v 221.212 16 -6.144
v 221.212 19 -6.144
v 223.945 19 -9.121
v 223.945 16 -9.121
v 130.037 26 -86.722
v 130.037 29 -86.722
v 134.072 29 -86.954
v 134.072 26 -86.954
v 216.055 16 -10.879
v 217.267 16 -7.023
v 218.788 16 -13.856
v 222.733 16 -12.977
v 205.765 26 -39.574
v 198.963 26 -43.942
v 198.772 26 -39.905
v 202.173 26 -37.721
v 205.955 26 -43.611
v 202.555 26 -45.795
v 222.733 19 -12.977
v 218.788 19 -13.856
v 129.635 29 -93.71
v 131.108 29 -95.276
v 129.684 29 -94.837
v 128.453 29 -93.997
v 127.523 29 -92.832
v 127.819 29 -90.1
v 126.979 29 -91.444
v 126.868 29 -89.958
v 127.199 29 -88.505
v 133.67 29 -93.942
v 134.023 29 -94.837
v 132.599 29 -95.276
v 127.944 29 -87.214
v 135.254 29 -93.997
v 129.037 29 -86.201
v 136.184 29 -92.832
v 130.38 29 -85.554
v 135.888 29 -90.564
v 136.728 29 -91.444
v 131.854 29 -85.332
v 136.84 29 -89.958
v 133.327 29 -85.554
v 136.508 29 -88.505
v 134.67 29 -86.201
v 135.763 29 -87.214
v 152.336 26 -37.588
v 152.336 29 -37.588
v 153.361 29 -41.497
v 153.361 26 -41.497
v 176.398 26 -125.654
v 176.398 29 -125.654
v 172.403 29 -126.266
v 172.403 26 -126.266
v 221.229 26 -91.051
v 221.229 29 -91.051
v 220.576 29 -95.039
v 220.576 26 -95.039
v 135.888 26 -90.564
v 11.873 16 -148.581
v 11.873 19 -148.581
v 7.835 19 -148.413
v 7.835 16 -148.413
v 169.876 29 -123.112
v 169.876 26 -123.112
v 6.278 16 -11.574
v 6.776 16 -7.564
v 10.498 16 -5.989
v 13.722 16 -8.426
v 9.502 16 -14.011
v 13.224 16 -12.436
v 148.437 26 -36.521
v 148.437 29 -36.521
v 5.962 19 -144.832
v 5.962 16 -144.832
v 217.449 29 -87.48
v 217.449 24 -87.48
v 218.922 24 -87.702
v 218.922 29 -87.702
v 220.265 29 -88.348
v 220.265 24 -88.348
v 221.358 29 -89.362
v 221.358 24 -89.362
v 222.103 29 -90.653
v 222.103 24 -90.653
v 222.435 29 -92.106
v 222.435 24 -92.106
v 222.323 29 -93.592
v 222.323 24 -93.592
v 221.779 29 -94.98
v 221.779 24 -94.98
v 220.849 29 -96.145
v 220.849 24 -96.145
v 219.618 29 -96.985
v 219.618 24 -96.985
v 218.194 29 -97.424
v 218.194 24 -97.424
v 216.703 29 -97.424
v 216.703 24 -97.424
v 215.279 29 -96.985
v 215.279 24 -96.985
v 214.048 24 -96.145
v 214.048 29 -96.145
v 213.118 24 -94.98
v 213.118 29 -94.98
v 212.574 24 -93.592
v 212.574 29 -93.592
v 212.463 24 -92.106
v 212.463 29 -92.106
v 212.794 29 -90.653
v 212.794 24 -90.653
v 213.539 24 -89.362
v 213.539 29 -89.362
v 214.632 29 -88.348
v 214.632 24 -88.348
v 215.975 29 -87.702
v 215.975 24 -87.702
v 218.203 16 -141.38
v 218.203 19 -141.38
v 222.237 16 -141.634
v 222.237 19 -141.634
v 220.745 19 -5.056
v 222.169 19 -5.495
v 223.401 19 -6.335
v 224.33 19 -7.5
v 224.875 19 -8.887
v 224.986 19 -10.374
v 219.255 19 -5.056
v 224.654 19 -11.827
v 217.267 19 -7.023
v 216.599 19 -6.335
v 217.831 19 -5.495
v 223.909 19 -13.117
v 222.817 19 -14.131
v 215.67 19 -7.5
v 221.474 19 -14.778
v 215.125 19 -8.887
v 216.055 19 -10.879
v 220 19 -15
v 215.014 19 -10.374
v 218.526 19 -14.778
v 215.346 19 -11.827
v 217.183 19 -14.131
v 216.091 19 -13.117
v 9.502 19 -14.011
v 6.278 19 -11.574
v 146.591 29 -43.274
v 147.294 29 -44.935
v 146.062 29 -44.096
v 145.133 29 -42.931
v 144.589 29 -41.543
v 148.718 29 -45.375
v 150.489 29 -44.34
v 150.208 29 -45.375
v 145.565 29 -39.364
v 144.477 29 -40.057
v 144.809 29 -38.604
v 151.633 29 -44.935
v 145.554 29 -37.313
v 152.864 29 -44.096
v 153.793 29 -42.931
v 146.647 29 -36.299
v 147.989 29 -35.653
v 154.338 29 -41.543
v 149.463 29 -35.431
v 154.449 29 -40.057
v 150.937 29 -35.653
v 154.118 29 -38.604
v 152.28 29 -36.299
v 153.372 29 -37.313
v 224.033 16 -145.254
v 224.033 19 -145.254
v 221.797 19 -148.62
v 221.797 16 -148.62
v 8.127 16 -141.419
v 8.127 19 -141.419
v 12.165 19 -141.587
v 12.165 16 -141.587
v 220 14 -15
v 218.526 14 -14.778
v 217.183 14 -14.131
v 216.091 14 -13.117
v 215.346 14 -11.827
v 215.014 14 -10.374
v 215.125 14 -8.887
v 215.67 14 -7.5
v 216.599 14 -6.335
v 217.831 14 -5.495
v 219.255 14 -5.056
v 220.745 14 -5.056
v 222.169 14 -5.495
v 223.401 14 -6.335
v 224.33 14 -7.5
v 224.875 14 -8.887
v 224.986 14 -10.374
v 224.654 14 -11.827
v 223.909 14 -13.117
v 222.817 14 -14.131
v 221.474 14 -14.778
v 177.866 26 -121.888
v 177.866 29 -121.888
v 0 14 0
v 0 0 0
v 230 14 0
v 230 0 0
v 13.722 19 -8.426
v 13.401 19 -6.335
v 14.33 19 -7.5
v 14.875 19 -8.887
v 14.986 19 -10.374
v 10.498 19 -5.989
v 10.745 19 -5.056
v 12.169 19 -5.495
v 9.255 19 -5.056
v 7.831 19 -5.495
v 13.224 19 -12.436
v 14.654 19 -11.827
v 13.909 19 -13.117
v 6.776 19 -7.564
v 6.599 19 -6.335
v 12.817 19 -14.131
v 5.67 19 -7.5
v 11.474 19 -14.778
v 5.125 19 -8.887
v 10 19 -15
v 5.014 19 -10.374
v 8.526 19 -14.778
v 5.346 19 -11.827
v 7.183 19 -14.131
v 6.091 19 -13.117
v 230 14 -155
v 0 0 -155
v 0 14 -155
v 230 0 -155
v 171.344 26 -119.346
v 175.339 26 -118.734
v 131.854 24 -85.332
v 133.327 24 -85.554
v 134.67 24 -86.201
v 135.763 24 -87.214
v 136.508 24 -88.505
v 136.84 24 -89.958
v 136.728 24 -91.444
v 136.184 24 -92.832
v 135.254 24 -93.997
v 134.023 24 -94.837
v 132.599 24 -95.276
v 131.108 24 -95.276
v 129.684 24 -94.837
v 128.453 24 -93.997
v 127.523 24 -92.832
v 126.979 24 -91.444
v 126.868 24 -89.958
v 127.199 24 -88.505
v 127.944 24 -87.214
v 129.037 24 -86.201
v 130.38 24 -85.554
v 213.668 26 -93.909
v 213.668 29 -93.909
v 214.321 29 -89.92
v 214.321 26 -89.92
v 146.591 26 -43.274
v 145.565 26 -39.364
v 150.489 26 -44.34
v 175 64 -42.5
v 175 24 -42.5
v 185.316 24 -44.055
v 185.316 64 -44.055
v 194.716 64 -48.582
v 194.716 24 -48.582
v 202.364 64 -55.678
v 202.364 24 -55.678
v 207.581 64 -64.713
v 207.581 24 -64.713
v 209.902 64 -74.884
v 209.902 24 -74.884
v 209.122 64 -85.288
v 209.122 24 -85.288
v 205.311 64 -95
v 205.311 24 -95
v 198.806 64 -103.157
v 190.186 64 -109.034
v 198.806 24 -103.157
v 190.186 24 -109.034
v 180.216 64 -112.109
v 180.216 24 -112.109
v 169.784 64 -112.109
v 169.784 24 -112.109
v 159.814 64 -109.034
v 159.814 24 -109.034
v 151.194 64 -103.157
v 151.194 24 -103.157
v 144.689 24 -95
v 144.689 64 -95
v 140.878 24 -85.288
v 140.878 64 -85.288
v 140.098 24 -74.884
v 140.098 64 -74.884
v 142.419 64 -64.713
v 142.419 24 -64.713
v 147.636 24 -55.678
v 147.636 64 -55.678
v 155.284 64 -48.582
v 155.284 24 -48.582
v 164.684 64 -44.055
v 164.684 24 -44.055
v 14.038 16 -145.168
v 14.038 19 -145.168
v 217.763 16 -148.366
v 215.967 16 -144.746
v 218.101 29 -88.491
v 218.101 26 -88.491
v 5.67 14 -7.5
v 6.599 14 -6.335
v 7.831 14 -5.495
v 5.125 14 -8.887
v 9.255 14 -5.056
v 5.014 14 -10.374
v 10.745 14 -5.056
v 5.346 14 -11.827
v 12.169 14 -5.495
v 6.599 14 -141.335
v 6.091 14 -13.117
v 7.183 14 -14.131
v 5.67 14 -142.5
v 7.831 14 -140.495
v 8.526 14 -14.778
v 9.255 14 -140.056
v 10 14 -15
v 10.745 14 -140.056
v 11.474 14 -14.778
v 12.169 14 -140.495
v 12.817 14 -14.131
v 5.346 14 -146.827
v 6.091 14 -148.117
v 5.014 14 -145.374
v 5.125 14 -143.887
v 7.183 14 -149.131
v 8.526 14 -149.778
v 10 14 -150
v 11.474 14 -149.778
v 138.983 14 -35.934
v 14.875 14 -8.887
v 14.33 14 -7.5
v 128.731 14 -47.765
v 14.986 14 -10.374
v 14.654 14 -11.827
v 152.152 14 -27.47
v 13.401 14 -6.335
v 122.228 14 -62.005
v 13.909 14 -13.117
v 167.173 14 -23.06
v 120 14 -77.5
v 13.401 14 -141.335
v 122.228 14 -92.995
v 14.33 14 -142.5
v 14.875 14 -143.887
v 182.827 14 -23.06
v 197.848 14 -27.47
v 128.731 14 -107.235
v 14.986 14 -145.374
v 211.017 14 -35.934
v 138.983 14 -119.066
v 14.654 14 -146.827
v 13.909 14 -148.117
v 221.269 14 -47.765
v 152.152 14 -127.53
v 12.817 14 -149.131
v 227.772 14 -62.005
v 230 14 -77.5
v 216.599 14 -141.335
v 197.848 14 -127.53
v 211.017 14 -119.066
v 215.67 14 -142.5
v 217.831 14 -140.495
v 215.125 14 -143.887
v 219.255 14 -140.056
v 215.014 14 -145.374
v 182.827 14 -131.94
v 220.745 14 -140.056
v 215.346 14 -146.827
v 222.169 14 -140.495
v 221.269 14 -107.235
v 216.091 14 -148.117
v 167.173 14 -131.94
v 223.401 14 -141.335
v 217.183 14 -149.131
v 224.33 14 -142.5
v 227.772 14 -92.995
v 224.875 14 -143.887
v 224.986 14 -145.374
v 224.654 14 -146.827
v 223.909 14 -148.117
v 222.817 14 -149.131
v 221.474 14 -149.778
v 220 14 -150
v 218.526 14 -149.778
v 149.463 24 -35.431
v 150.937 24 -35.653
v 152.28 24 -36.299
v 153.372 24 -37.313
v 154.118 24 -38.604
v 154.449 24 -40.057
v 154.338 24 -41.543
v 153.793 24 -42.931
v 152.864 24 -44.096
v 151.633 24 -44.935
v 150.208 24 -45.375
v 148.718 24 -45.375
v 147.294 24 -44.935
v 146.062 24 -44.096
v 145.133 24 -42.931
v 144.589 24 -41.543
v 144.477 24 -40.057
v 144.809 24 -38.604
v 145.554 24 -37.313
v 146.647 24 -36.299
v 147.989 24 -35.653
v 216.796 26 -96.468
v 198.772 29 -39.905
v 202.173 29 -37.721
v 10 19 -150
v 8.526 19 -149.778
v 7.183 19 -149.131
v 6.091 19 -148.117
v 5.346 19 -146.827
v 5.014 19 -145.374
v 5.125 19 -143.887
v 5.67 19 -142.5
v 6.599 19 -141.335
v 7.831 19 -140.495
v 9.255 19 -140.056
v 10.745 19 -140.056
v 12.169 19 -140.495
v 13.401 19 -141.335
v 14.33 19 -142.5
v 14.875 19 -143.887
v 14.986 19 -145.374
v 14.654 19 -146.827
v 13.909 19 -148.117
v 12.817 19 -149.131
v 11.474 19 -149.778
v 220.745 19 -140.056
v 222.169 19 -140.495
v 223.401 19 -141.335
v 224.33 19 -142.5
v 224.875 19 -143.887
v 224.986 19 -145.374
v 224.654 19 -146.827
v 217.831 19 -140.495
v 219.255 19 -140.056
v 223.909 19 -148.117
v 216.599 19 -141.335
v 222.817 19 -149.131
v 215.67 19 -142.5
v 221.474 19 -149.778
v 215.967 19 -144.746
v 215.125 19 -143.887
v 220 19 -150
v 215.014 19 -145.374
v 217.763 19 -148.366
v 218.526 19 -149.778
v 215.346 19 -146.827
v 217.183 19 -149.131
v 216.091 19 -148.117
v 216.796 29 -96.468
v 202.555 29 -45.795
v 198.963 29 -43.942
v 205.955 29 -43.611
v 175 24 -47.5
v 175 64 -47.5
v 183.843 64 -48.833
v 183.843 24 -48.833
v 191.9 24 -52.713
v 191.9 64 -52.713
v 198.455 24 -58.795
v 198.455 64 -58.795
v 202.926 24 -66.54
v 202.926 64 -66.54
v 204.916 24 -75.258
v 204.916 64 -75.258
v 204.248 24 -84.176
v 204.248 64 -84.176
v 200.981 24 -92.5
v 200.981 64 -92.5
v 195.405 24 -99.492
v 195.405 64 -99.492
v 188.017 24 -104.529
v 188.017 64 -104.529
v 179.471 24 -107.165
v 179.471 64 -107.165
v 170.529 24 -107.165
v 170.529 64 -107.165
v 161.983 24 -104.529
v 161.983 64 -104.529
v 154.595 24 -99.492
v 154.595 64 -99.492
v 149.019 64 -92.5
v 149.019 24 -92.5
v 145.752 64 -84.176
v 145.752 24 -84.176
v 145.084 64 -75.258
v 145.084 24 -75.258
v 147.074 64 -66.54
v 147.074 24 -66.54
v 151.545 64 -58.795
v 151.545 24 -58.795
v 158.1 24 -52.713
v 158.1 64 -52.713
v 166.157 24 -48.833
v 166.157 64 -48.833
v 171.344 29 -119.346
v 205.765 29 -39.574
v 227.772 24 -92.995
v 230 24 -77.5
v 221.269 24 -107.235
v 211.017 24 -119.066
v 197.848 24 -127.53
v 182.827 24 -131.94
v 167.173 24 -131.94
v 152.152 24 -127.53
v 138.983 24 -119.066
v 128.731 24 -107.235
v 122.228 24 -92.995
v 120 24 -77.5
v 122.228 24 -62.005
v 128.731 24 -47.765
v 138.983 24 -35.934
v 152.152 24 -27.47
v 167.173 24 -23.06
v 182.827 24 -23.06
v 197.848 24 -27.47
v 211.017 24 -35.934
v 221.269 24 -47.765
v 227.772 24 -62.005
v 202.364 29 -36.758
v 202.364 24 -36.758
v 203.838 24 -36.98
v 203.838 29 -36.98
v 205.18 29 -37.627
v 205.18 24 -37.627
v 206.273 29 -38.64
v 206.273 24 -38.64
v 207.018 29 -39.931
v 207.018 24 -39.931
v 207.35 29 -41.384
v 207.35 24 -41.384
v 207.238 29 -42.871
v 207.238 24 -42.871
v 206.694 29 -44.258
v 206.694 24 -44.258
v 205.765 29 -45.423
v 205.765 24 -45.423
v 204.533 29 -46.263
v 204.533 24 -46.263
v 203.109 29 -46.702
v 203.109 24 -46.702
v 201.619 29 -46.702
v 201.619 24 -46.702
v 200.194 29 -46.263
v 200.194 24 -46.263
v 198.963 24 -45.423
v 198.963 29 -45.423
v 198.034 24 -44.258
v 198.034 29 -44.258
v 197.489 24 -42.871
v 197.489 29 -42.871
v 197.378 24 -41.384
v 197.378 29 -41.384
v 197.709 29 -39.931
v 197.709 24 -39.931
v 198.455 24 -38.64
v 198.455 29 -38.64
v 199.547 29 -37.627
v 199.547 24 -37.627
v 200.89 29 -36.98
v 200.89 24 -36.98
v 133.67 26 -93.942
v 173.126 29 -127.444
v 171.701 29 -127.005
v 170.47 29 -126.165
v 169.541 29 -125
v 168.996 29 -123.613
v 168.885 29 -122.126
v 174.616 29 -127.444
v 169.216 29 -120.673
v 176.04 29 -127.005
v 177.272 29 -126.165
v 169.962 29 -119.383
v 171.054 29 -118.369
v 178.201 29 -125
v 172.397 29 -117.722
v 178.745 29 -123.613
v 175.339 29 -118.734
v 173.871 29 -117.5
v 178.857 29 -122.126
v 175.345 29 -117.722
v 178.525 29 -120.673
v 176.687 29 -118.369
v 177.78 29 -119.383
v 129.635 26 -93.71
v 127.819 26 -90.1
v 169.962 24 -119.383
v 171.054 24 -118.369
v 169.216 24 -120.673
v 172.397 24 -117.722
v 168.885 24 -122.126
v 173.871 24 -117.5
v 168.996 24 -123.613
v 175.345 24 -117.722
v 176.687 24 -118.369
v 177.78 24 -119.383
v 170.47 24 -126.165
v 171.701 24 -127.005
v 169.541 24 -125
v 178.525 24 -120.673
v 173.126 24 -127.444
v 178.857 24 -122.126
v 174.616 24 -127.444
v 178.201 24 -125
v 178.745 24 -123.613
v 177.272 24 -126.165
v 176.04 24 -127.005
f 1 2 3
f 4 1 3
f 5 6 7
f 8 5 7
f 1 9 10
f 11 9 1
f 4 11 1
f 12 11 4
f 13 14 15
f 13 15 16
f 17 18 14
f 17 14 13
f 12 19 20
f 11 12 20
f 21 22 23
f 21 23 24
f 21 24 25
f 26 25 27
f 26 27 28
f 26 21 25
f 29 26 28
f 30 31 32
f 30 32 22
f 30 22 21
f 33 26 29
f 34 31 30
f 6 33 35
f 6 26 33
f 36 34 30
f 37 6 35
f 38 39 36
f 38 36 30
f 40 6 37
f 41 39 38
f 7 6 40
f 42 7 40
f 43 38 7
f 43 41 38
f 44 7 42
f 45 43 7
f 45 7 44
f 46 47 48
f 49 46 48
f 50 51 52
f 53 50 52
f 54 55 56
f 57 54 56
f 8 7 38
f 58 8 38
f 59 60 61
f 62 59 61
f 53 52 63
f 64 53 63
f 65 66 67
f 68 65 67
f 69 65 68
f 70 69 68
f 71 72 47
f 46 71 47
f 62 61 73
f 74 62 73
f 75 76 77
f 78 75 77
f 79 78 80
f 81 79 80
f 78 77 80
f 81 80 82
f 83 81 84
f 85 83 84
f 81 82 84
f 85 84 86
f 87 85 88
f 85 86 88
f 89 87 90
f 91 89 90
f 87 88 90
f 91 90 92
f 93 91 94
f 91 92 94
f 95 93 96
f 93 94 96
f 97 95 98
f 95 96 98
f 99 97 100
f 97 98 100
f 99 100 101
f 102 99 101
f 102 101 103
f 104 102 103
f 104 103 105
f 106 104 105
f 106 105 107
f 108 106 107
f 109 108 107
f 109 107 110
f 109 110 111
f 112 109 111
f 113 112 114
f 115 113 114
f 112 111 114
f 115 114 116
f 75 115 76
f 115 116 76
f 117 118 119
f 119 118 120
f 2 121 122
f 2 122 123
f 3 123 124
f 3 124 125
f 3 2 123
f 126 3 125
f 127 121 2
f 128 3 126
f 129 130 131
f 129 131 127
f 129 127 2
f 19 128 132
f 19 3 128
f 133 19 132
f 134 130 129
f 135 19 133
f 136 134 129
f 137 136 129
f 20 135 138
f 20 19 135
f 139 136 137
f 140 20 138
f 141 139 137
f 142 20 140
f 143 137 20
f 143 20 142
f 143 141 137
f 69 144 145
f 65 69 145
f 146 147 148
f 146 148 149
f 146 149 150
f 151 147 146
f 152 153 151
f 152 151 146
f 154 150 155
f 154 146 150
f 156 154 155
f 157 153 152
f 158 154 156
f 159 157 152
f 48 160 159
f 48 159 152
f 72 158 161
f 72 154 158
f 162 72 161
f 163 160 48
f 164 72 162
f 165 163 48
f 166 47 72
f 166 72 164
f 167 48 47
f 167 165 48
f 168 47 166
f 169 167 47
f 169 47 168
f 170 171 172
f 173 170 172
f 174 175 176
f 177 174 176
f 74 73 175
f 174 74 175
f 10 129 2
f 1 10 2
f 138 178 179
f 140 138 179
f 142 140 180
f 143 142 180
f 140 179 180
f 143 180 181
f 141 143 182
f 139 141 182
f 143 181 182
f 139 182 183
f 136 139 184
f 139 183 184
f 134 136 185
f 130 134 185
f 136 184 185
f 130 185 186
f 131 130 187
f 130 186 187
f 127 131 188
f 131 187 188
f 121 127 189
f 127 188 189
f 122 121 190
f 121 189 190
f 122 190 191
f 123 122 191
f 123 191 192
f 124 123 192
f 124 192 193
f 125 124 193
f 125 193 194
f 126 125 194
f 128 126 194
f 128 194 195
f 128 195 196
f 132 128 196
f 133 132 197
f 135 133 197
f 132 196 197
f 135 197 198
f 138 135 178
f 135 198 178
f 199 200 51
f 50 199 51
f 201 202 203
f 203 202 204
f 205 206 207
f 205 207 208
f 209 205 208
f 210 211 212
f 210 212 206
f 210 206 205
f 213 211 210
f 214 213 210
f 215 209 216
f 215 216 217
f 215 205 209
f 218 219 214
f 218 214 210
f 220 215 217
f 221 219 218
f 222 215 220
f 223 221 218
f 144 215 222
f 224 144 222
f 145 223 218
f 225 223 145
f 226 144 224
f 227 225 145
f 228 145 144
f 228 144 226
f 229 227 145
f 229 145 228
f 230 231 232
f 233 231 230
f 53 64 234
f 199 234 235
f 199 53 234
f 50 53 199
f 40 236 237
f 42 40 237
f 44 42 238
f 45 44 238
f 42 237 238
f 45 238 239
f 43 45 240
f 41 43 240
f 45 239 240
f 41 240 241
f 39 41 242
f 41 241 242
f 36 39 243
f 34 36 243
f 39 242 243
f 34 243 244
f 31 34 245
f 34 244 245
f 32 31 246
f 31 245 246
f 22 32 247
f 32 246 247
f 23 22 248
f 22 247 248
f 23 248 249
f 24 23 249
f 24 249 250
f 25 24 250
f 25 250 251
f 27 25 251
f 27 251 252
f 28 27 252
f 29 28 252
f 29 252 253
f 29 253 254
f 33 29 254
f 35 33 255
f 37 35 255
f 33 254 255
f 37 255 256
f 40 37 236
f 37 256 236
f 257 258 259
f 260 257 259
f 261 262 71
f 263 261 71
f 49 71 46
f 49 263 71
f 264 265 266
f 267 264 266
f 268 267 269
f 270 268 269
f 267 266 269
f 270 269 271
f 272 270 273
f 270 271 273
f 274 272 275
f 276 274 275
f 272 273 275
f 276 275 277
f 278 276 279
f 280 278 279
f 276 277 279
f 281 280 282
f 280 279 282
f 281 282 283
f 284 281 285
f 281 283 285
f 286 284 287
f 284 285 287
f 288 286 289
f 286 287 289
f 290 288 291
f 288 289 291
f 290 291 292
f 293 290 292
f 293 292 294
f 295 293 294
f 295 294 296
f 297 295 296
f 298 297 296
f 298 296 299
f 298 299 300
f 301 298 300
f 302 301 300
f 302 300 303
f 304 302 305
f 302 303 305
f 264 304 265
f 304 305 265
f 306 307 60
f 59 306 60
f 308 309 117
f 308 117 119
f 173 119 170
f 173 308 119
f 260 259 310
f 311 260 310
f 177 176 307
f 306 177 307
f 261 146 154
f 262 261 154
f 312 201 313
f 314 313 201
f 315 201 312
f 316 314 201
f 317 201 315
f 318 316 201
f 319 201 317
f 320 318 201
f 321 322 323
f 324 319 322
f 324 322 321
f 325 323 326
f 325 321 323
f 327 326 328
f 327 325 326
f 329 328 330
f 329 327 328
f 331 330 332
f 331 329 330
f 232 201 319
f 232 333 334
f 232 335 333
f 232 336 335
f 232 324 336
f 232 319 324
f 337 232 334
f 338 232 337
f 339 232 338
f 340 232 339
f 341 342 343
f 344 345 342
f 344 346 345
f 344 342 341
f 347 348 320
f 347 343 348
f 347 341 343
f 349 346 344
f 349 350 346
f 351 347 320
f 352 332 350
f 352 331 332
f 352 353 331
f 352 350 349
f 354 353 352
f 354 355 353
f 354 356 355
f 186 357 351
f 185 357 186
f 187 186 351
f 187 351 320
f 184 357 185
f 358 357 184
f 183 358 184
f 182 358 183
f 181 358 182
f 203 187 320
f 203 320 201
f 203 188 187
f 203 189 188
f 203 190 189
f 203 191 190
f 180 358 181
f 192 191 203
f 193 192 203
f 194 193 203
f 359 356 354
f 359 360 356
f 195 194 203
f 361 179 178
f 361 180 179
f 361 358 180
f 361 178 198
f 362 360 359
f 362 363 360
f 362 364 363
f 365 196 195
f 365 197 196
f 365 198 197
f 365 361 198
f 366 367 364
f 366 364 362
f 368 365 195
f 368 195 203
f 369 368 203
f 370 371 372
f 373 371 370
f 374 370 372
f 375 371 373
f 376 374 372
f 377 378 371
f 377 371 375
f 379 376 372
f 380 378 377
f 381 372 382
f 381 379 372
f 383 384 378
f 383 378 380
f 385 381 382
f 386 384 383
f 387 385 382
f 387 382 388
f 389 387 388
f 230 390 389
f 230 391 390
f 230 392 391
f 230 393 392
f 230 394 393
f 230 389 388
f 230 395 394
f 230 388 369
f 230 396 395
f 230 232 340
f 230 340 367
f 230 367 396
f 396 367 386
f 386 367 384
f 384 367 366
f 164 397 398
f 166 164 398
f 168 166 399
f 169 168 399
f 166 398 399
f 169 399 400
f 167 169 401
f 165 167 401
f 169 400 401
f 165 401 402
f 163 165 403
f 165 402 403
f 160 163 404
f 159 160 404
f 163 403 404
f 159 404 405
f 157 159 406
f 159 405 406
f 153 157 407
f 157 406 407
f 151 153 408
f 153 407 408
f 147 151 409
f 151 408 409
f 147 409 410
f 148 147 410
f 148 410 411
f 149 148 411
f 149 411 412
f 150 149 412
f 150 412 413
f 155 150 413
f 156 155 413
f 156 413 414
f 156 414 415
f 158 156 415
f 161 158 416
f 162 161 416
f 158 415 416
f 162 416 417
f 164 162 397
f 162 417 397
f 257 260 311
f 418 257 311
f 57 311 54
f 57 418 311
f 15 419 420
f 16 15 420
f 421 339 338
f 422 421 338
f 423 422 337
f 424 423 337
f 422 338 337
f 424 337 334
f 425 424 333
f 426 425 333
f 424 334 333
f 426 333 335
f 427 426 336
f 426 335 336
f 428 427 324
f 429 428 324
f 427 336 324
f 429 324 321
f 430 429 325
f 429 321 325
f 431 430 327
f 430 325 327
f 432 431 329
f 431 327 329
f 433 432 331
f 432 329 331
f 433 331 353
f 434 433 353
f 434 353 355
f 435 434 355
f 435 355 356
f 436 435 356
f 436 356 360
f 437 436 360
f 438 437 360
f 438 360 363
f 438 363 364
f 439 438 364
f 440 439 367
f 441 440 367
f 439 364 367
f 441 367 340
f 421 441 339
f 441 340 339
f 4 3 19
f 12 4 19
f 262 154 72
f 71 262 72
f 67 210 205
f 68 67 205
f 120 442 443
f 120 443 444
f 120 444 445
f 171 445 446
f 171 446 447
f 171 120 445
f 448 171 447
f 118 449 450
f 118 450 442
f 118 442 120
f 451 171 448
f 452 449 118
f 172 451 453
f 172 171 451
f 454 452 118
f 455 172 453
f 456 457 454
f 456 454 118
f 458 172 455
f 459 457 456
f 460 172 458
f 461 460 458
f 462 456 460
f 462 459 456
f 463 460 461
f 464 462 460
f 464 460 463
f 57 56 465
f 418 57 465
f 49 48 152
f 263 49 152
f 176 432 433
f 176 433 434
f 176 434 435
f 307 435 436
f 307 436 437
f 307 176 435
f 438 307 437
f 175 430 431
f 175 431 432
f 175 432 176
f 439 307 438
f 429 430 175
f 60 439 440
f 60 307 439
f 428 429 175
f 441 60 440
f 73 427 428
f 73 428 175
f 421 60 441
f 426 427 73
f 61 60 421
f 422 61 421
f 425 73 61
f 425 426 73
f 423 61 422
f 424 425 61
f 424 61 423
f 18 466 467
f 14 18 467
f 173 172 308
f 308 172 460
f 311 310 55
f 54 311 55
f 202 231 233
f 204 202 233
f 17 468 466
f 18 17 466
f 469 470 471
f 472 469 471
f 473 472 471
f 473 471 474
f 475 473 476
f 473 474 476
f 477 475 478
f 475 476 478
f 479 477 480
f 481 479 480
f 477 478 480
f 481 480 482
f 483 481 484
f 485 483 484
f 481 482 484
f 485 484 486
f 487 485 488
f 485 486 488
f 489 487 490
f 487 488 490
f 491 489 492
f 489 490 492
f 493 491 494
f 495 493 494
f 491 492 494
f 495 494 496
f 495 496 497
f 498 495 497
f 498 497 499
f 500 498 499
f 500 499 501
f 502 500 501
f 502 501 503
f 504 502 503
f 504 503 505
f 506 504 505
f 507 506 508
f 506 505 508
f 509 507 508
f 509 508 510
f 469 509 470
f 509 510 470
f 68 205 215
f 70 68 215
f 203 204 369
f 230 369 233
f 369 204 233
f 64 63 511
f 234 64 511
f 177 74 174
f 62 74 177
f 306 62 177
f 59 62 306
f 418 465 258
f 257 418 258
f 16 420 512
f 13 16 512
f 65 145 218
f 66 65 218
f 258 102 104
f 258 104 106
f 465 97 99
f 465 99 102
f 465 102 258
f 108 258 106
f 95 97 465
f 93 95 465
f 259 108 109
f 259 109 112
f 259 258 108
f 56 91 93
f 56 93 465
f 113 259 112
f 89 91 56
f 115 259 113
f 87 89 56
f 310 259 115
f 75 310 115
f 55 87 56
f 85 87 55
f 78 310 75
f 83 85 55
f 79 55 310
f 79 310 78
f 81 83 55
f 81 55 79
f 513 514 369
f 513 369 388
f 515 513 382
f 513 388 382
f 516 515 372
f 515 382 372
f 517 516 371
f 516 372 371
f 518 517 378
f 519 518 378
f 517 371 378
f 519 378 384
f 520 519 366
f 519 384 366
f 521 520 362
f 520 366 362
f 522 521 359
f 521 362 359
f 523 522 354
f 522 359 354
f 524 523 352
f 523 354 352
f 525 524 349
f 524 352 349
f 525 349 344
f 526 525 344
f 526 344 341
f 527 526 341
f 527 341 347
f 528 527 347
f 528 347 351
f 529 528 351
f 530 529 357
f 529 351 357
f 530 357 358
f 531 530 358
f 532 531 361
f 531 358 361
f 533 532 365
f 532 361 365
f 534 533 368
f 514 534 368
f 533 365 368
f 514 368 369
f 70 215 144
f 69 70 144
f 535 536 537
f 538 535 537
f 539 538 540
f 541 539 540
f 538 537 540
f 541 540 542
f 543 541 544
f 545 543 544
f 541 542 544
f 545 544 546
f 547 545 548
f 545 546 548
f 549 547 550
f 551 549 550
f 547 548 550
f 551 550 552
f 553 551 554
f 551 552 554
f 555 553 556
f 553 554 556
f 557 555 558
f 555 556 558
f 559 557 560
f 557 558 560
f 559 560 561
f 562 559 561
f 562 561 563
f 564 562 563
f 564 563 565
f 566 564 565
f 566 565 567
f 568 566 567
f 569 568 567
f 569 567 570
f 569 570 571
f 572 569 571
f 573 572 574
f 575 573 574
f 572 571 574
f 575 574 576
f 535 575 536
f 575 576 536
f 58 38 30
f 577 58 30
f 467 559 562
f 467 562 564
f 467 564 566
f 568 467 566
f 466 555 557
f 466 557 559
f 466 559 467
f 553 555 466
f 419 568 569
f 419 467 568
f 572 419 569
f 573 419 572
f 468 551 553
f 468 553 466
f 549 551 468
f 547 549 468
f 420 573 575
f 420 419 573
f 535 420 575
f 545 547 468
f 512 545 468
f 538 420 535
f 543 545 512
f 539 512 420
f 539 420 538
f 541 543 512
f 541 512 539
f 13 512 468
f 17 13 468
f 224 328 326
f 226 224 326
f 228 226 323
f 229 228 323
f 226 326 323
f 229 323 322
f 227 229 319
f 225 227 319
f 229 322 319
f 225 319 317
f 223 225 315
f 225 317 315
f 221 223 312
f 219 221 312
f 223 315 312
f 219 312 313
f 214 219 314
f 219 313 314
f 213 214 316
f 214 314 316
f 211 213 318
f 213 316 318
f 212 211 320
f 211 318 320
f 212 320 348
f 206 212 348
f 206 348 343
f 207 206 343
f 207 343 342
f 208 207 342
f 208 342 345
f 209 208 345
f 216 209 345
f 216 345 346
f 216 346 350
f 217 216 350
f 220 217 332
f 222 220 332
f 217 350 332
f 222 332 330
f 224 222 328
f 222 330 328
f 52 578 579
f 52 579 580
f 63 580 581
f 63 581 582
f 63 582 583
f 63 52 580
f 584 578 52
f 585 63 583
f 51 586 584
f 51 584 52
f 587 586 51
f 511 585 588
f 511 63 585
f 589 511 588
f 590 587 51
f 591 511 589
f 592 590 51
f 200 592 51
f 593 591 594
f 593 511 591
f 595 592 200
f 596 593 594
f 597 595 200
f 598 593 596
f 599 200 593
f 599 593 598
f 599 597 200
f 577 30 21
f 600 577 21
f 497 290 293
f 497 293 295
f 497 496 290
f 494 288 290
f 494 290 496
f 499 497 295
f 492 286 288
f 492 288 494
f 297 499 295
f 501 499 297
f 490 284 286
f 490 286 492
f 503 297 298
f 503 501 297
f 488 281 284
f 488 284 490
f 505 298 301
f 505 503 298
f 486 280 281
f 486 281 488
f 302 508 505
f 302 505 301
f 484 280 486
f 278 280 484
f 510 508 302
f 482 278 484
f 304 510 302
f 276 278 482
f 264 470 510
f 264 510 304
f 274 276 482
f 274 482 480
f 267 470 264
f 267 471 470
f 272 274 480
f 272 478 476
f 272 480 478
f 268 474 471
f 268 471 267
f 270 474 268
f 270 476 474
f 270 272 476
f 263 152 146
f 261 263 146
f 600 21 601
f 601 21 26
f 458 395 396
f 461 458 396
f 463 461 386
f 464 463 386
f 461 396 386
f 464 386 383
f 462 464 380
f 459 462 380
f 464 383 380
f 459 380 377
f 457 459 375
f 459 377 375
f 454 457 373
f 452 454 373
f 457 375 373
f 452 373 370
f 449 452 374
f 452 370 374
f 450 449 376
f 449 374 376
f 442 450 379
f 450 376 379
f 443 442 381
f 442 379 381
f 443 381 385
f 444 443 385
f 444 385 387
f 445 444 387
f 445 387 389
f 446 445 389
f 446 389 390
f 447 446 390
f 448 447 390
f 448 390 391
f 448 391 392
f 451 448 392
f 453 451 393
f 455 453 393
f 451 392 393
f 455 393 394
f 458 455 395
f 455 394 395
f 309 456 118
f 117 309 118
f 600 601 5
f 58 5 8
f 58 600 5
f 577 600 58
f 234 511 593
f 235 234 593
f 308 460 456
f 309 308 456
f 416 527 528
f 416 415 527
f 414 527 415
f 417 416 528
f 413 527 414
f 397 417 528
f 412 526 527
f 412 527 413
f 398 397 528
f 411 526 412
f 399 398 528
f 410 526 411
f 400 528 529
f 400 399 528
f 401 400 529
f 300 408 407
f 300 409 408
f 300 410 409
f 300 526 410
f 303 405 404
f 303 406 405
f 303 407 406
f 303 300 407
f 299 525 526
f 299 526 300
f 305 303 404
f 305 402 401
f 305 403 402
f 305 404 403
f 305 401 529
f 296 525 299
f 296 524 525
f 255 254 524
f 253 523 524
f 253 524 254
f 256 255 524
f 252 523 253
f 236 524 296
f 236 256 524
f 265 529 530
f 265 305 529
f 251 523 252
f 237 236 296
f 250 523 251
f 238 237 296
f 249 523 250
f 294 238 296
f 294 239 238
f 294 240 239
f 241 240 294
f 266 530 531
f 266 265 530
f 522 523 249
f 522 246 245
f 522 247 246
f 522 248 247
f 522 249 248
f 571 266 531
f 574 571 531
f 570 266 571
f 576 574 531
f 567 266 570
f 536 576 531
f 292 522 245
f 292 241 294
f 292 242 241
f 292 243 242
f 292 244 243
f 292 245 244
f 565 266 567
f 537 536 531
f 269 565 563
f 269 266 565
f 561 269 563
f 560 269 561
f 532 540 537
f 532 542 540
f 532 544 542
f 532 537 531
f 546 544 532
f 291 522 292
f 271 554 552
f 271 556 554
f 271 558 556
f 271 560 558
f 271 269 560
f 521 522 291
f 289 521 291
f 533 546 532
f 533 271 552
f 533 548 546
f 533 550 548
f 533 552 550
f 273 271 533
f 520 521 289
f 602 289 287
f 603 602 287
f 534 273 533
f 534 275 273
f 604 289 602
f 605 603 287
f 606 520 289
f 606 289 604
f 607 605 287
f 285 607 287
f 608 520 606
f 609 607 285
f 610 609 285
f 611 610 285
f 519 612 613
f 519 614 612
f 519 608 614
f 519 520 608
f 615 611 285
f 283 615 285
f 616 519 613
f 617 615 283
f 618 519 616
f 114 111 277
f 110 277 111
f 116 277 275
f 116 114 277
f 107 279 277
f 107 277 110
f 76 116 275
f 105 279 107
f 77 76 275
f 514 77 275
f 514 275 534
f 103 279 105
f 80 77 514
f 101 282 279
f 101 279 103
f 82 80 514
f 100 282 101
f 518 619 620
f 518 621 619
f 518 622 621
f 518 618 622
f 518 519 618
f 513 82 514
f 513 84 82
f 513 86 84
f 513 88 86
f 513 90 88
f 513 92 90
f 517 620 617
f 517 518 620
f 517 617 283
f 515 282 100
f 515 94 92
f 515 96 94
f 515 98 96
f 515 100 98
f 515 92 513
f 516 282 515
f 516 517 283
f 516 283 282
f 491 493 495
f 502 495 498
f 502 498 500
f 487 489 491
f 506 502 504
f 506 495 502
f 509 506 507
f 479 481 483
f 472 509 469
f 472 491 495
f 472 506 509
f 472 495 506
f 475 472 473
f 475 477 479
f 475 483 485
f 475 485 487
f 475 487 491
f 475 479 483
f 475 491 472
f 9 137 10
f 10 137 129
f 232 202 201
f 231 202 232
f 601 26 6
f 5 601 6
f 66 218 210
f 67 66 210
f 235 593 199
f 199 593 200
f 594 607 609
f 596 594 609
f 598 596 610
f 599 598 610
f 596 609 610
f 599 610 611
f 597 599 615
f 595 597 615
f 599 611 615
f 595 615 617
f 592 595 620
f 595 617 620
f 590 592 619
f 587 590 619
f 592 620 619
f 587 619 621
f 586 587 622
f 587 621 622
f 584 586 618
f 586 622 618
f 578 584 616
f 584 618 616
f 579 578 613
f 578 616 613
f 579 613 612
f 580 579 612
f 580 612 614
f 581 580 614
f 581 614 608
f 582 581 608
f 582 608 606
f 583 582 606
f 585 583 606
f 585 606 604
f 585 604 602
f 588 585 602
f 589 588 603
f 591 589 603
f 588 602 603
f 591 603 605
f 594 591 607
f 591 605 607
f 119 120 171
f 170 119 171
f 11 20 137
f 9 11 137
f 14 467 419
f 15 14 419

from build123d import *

# Parameters (mm, degrees)
SKETCH1_W           = 230
SKETCH1_H           = 155
BOSS_EXTRUDE1_DEPTH = 14
SKETCH2_R           = 55
BOSS_EXTRUDE2_DEPTH = 10
SKETCH4_R           = 35
BOSS_EXTRUDE3_DEPTH = 40
SKETCH8_R           = 30
CUT_EXTRUDE1_DEPTH  = 40
SKETCH11_R          = 5
BOSS_EXTRUDE5_DEPTH = 5
CUT_EXTRUDE3_DEPTH  = 3
SKETCH14_R          = 5
BOSS_EXTRUDE8_DEPTH = 5
CUT_EXTRUDE4_DEPTH  = 3


with BuildPart() as part:
    # Sketch1 → Boss-Extrude1 (new body)
    with BuildSketch(Plane(origin=(0, 0, 0), x_dir=(1, 0, 0), z_dir=(0, 1, 0))):
        with Locations((115, 77.5)):
            Rectangle(SKETCH1_W, SKETCH1_H)
    extrude(amount=BOSS_EXTRUDE1_DEPTH)

    # Sketch2 → Boss-Extrude2 (add)
    with BuildSketch(Plane(origin=(0, 14, 0), x_dir=(1, 0, 0), z_dir=(0, 1, 0))):
        with Locations((175, 77.5)):
            Circle(SKETCH2_R)
    extrude(amount=BOSS_EXTRUDE2_DEPTH)

    # Sketch4 → Boss-Extrude3 (add)
    with BuildSketch(Plane(origin=(0, 24, 0), x_dir=(1, 0, 0), z_dir=(0, 1, 0))):
        with Locations(Location((175, 77.5, 0), (0, 0, 270))):
            Circle(SKETCH4_R)
    extrude(amount=BOSS_EXTRUDE3_DEPTH)

    # Sketch8 → Cut-Extrude1 (cut)
    with BuildSketch(Plane(origin=(0, 64, 0), x_dir=(1, 0, 0), z_dir=(0, 1, 0))):
        with Locations(Location((175, 77.5, 0), (0, 0, 270))):
            Circle(SKETCH8_R)
    extrude(amount=-CUT_EXTRUDE1_DEPTH, mode=Mode.SUBTRACT)

    # Sketch11 → Boss-Extrude5 (add)
    with BuildSketch(Plane(origin=(0, 14, 0), x_dir=(1, 0, 0), z_dir=(0, 1, 0))):
        with Locations(Location((10, 10, 0), (0, 0, 90))):
            Circle(SKETCH11_R)
        with Locations(Location((10, 145, 0), (0, 0, 90))):
            Circle(SKETCH11_R)
        with Locations(Location((220, 145, 0), (0, 0, 90))):
            Circle(SKETCH11_R)
        with Locations(Location((220, 10, 0), (0, 0, 90))):
            Circle(SKETCH11_R)
    extrude(amount=BOSS_EXTRUDE5_DEPTH)

    # Sketch13 → Cut-Extrude3 (cut)
    with BuildSketch(Plane(origin=(0, 19, 0), x_dir=(1, 0, 0), z_dir=(0, 1, 0))):
        Polygon((13.224457924, 12.436432727), (9.502216326, 14.010678839), (6.277758402, 11.574246112), (6.775542076, 7.563567273), (10.497783674, 5.989321161), (13.722241598, 8.425753888), align=None)
        Polygon((11.87304845, 148.581204105), (7.835110494, 148.412709592), (5.962062044, 144.831505488), (8.12695155, 141.418795895), (12.164889506, 141.587290408), (14.037937956, 145.168494512), align=None)
        Polygon((224.033447208, 145.254237993), (221.796547043, 148.620186743), (217.763099836, 148.36594875), (215.966552792, 144.745762007), (218.203452957, 141.379813257), (222.236900164, 141.63405125), align=None)
        Polygon((222.73323395, 12.977039723), (218.788424947, 13.855569896), (216.055190997, 10.878530173), (217.26676605, 7.022960277), (221.211575053, 6.144430104), (223.944809003, 9.121469827), align=None)
    extrude(amount=-CUT_EXTRUDE3_DEPTH, mode=Mode.SUBTRACT)

    # Sketch14 → Boss-Extrude8 (add)
    with BuildSketch(Plane(origin=(0, 24, 0), x_dir=(1, 0, 0), z_dir=(0, 1, 0))):
        with Locations(Location((173.870837224, 122.5, 0), (0, 0, 270))):
            Circle(SKETCH14_R)
        with Locations(Location((217.448612746, 92.479662363, 0), (0, 0, 270))):
            Circle(SKETCH14_R)
        with Locations(Location((202.363848229, 41.75794048, 0), (0, 0, 270))):
            Circle(SKETCH14_R)
        with Locations(Location((149.463175522, 40.430530026, 0), (0, 0, 270))):
            Circle(SKETCH14_R)
        with Locations(Location((131.853526279, 90.331867131, 0), (0, 0, 270))):
            Circle(SKETCH14_R)
    extrude(amount=BOSS_EXTRUDE8_DEPTH)

    # Sketch15 → Cut-Extrude4 (cut)
    with BuildSketch(Plane(origin=(0, 29, 0), x_dir=(1, 0, 0), z_dir=(0, 1, 0))):
        Polygon((221.229030496, 91.050755448), (220.576291309, 95.039146714), (216.795873559, 96.468053629), (213.668194996, 93.908569278), (214.320934183, 89.920178012), (218.101351933, 88.491271098), align=None)
        Polygon((176.398021787, 125.653834415), (172.403128782, 126.265523239), (169.875944219, 123.111688824), (171.343652661, 119.346165585), (175.338545665, 118.734476761), (177.865730228, 121.888311176), align=None)
        Polygon((202.173090327, 37.720993025), (205.764568327, 39.574265564), (205.955326229, 43.611213019), (202.554606131, 45.794887936), (198.96312813, 43.941615397), (198.772370228, 39.904667942), align=None)
        Polygon((145.564862905, 39.364466202), (148.437257567, 36.521460356), (152.335570184, 37.587524179), (153.361488139, 41.496593849), (150.489093478, 44.339599695), (146.590780861, 43.273535872), align=None)
        Polygon((129.634994486, 93.709950909), (127.818754014, 90.099604127), (130.037285808, 86.721520349), (134.072058073, 86.953783352), (135.888298544, 90.564130134), (133.669766751, 93.942213912), align=None)
    extrude(amount=-CUT_EXTRUDE4_DEPTH, mode=Mode.SUBTRACT)


solid = part.part
